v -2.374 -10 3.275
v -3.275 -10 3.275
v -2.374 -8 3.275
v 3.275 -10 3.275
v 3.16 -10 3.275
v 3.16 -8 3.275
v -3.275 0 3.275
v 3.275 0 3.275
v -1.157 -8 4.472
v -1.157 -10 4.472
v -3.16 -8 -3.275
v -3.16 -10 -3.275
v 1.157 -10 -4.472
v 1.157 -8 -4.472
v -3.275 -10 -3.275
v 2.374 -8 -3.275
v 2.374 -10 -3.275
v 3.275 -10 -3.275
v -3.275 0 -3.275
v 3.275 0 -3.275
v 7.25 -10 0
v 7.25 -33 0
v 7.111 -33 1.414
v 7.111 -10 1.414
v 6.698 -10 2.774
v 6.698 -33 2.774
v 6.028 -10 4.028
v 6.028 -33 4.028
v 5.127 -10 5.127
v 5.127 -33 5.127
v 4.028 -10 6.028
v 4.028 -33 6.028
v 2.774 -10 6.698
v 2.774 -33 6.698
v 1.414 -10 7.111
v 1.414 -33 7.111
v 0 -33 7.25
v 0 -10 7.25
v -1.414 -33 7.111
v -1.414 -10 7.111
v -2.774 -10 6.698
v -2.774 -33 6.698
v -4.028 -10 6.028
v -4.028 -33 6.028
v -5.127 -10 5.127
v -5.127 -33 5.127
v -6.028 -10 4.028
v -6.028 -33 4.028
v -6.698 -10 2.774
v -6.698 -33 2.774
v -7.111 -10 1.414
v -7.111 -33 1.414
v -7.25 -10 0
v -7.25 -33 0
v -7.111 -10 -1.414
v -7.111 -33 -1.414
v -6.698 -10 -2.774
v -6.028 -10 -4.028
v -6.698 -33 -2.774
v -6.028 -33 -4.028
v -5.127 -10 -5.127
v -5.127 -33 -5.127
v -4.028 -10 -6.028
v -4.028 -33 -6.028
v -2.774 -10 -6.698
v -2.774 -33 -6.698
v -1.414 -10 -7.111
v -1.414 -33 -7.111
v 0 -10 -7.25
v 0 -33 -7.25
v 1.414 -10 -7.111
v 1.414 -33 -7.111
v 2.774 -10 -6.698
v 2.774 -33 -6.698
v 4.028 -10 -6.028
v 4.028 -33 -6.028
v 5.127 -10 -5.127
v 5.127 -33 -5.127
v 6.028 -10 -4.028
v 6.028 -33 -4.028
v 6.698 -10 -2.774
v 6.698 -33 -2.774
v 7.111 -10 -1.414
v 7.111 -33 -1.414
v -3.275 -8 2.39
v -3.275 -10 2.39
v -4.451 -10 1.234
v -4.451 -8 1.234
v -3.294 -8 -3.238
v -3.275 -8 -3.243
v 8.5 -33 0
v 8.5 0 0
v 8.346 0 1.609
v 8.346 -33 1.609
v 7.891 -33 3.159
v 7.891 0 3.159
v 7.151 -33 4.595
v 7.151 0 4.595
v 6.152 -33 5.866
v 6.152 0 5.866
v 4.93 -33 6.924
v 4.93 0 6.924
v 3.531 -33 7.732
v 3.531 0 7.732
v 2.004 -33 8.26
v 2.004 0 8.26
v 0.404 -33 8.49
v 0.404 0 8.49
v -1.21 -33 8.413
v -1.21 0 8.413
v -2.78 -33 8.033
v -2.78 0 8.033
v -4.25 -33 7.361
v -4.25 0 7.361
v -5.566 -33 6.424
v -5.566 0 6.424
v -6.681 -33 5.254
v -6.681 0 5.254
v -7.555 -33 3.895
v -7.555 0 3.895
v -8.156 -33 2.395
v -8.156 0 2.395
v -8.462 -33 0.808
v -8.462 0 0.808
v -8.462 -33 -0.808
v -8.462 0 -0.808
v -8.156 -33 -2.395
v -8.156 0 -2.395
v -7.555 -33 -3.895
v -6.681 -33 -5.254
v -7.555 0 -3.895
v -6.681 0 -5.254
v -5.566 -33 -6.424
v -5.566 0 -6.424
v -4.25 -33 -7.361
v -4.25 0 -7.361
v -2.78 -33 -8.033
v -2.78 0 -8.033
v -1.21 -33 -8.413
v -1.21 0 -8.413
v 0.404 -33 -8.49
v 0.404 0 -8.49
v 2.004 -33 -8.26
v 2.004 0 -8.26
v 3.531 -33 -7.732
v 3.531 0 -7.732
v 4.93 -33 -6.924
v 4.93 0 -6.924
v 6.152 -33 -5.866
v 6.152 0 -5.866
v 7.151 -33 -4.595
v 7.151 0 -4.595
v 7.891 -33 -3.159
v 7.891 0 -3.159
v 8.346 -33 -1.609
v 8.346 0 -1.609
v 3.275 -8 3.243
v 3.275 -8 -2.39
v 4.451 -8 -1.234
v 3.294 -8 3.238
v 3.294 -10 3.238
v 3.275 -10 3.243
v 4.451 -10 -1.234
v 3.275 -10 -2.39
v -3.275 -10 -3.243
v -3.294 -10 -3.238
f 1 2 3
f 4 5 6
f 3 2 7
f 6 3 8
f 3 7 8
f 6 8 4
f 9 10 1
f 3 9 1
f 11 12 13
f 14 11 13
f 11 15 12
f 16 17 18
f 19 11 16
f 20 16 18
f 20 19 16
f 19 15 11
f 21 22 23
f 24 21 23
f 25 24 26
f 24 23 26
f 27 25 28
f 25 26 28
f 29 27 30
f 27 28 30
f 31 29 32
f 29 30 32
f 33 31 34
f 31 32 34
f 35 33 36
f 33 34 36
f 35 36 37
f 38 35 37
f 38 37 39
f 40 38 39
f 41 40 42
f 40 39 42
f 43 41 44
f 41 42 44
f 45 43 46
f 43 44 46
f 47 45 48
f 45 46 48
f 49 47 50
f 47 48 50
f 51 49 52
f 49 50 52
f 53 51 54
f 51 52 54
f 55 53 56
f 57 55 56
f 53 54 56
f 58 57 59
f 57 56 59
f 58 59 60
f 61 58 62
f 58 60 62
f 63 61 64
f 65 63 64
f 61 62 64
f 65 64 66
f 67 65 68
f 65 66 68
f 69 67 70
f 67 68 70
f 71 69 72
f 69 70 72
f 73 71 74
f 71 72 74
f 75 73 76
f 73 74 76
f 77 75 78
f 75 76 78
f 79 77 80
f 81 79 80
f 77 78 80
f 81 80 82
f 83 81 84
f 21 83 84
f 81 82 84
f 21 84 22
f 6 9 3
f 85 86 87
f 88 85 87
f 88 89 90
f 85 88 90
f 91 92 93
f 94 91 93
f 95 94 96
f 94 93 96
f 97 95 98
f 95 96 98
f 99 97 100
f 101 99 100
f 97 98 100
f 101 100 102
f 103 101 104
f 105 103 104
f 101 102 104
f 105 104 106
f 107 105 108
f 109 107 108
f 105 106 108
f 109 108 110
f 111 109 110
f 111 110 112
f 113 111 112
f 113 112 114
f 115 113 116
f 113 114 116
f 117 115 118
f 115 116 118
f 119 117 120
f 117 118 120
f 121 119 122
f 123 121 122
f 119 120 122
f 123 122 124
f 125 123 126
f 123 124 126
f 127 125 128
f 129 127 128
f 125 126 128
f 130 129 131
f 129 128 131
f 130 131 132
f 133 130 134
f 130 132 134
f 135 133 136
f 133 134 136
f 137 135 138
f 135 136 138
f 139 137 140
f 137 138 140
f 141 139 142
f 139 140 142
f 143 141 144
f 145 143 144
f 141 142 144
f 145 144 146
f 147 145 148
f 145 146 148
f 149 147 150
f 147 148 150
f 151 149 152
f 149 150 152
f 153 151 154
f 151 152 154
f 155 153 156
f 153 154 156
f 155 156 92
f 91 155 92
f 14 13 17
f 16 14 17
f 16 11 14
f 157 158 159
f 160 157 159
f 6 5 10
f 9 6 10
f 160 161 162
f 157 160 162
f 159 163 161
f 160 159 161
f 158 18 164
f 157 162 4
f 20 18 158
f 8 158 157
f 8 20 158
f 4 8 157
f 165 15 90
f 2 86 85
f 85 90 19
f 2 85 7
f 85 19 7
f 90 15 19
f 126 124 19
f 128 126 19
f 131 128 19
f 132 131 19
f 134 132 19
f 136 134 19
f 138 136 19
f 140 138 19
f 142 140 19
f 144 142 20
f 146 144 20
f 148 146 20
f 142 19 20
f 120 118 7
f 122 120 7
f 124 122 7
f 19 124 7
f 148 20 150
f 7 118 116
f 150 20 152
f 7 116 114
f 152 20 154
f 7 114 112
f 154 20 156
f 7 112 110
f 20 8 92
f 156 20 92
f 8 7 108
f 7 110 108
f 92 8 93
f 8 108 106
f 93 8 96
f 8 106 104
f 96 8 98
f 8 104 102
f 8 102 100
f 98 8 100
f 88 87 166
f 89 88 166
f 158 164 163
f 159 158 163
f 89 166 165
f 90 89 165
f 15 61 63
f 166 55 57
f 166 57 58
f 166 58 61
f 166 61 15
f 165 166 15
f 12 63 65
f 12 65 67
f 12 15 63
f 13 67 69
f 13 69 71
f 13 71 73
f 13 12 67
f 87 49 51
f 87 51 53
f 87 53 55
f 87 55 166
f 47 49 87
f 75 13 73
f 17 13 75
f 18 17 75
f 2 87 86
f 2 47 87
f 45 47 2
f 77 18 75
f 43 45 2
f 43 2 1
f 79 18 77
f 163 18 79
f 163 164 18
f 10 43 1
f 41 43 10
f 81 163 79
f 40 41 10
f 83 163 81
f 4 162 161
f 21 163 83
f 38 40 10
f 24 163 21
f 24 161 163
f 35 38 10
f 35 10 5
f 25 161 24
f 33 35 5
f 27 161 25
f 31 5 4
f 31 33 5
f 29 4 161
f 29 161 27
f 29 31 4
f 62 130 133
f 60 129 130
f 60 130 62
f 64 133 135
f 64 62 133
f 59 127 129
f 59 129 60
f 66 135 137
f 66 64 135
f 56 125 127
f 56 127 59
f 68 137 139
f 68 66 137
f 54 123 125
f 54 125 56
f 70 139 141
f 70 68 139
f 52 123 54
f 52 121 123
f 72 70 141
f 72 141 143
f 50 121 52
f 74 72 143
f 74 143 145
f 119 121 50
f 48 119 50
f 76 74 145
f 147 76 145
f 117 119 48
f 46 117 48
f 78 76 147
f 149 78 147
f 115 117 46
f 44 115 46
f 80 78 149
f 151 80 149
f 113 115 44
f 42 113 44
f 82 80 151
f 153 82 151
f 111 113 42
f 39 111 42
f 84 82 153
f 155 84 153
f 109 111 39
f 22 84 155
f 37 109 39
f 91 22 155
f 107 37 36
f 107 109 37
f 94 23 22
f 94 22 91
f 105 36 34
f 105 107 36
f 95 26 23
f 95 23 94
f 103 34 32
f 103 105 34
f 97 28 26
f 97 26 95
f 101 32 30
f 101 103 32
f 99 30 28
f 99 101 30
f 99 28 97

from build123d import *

# Parameters (mm, degrees)
F0_R     = 8.5
F0_W     = 6.55
F0_H     = 6.55
F1_DEPTH = 33
F3_DEPTH = 25
F4_R     = 7.25
F5_DEPTH = 23


with BuildPart() as f1:
    # F0 (on Front) → F1 (new body)
    with BuildSketch(Plane.XZ):
        Circle(F0_R)
        Rectangle(F0_W, F0_H, mode=Mode.SUBTRACT)
    extrude(amount=F1_DEPTH)

    # F2 (on face) → F3 (cut)
    with BuildSketch(Plane.XZ.offset(33)):
        Polygon((-3.275, -3.243106), (-3.275, 2.389649), (-4.451013, 1.233619), (-3.293852, -3.237881), align=None)
        Polygon((1.157162, -4.4715), (2.374344, -3.275), (-3.159923, -3.275), align=None)
        Polygon((4.451013, -1.233619), (3.293852, 3.237881), (3.275, 3.243106), (3.275, -2.389649), align=None)
        Polygon((-2.374344, 3.275), (3.159923, 3.275), (-1.157162, 4.4715), align=None)
    extrude(amount=-F3_DEPTH, mode=Mode.SUBTRACT)

    # F4 (on face) → F5 (cut)
    with BuildSketch(Plane.XZ.offset(33)):
        Circle(F4_R)
        Polygon((-1.157162, 4.4715), (3.159923, 3.275), (3.275, 3.275), (3.275, 3.243106), (3.293852, 3.237881), (4.451013, -1.233619), (3.275, -2.389649), (3.275, -3.275), (2.374344, -3.275), (1.157162, -4.4715), (-3.159923, -3.275), (-3.275, -3.275), (-3.275, -3.243106), (-3.293852, -3.237881), (-4.451013, 1.233619), (-3.275, 2.389649), (-3.275, 3.275), (-2.374344, 3.275), align=None, mode=Mode.SUBTRACT)
    extrude(amount=-F5_DEPTH, mode=Mode.SUBTRACT)


solid = f1.part
